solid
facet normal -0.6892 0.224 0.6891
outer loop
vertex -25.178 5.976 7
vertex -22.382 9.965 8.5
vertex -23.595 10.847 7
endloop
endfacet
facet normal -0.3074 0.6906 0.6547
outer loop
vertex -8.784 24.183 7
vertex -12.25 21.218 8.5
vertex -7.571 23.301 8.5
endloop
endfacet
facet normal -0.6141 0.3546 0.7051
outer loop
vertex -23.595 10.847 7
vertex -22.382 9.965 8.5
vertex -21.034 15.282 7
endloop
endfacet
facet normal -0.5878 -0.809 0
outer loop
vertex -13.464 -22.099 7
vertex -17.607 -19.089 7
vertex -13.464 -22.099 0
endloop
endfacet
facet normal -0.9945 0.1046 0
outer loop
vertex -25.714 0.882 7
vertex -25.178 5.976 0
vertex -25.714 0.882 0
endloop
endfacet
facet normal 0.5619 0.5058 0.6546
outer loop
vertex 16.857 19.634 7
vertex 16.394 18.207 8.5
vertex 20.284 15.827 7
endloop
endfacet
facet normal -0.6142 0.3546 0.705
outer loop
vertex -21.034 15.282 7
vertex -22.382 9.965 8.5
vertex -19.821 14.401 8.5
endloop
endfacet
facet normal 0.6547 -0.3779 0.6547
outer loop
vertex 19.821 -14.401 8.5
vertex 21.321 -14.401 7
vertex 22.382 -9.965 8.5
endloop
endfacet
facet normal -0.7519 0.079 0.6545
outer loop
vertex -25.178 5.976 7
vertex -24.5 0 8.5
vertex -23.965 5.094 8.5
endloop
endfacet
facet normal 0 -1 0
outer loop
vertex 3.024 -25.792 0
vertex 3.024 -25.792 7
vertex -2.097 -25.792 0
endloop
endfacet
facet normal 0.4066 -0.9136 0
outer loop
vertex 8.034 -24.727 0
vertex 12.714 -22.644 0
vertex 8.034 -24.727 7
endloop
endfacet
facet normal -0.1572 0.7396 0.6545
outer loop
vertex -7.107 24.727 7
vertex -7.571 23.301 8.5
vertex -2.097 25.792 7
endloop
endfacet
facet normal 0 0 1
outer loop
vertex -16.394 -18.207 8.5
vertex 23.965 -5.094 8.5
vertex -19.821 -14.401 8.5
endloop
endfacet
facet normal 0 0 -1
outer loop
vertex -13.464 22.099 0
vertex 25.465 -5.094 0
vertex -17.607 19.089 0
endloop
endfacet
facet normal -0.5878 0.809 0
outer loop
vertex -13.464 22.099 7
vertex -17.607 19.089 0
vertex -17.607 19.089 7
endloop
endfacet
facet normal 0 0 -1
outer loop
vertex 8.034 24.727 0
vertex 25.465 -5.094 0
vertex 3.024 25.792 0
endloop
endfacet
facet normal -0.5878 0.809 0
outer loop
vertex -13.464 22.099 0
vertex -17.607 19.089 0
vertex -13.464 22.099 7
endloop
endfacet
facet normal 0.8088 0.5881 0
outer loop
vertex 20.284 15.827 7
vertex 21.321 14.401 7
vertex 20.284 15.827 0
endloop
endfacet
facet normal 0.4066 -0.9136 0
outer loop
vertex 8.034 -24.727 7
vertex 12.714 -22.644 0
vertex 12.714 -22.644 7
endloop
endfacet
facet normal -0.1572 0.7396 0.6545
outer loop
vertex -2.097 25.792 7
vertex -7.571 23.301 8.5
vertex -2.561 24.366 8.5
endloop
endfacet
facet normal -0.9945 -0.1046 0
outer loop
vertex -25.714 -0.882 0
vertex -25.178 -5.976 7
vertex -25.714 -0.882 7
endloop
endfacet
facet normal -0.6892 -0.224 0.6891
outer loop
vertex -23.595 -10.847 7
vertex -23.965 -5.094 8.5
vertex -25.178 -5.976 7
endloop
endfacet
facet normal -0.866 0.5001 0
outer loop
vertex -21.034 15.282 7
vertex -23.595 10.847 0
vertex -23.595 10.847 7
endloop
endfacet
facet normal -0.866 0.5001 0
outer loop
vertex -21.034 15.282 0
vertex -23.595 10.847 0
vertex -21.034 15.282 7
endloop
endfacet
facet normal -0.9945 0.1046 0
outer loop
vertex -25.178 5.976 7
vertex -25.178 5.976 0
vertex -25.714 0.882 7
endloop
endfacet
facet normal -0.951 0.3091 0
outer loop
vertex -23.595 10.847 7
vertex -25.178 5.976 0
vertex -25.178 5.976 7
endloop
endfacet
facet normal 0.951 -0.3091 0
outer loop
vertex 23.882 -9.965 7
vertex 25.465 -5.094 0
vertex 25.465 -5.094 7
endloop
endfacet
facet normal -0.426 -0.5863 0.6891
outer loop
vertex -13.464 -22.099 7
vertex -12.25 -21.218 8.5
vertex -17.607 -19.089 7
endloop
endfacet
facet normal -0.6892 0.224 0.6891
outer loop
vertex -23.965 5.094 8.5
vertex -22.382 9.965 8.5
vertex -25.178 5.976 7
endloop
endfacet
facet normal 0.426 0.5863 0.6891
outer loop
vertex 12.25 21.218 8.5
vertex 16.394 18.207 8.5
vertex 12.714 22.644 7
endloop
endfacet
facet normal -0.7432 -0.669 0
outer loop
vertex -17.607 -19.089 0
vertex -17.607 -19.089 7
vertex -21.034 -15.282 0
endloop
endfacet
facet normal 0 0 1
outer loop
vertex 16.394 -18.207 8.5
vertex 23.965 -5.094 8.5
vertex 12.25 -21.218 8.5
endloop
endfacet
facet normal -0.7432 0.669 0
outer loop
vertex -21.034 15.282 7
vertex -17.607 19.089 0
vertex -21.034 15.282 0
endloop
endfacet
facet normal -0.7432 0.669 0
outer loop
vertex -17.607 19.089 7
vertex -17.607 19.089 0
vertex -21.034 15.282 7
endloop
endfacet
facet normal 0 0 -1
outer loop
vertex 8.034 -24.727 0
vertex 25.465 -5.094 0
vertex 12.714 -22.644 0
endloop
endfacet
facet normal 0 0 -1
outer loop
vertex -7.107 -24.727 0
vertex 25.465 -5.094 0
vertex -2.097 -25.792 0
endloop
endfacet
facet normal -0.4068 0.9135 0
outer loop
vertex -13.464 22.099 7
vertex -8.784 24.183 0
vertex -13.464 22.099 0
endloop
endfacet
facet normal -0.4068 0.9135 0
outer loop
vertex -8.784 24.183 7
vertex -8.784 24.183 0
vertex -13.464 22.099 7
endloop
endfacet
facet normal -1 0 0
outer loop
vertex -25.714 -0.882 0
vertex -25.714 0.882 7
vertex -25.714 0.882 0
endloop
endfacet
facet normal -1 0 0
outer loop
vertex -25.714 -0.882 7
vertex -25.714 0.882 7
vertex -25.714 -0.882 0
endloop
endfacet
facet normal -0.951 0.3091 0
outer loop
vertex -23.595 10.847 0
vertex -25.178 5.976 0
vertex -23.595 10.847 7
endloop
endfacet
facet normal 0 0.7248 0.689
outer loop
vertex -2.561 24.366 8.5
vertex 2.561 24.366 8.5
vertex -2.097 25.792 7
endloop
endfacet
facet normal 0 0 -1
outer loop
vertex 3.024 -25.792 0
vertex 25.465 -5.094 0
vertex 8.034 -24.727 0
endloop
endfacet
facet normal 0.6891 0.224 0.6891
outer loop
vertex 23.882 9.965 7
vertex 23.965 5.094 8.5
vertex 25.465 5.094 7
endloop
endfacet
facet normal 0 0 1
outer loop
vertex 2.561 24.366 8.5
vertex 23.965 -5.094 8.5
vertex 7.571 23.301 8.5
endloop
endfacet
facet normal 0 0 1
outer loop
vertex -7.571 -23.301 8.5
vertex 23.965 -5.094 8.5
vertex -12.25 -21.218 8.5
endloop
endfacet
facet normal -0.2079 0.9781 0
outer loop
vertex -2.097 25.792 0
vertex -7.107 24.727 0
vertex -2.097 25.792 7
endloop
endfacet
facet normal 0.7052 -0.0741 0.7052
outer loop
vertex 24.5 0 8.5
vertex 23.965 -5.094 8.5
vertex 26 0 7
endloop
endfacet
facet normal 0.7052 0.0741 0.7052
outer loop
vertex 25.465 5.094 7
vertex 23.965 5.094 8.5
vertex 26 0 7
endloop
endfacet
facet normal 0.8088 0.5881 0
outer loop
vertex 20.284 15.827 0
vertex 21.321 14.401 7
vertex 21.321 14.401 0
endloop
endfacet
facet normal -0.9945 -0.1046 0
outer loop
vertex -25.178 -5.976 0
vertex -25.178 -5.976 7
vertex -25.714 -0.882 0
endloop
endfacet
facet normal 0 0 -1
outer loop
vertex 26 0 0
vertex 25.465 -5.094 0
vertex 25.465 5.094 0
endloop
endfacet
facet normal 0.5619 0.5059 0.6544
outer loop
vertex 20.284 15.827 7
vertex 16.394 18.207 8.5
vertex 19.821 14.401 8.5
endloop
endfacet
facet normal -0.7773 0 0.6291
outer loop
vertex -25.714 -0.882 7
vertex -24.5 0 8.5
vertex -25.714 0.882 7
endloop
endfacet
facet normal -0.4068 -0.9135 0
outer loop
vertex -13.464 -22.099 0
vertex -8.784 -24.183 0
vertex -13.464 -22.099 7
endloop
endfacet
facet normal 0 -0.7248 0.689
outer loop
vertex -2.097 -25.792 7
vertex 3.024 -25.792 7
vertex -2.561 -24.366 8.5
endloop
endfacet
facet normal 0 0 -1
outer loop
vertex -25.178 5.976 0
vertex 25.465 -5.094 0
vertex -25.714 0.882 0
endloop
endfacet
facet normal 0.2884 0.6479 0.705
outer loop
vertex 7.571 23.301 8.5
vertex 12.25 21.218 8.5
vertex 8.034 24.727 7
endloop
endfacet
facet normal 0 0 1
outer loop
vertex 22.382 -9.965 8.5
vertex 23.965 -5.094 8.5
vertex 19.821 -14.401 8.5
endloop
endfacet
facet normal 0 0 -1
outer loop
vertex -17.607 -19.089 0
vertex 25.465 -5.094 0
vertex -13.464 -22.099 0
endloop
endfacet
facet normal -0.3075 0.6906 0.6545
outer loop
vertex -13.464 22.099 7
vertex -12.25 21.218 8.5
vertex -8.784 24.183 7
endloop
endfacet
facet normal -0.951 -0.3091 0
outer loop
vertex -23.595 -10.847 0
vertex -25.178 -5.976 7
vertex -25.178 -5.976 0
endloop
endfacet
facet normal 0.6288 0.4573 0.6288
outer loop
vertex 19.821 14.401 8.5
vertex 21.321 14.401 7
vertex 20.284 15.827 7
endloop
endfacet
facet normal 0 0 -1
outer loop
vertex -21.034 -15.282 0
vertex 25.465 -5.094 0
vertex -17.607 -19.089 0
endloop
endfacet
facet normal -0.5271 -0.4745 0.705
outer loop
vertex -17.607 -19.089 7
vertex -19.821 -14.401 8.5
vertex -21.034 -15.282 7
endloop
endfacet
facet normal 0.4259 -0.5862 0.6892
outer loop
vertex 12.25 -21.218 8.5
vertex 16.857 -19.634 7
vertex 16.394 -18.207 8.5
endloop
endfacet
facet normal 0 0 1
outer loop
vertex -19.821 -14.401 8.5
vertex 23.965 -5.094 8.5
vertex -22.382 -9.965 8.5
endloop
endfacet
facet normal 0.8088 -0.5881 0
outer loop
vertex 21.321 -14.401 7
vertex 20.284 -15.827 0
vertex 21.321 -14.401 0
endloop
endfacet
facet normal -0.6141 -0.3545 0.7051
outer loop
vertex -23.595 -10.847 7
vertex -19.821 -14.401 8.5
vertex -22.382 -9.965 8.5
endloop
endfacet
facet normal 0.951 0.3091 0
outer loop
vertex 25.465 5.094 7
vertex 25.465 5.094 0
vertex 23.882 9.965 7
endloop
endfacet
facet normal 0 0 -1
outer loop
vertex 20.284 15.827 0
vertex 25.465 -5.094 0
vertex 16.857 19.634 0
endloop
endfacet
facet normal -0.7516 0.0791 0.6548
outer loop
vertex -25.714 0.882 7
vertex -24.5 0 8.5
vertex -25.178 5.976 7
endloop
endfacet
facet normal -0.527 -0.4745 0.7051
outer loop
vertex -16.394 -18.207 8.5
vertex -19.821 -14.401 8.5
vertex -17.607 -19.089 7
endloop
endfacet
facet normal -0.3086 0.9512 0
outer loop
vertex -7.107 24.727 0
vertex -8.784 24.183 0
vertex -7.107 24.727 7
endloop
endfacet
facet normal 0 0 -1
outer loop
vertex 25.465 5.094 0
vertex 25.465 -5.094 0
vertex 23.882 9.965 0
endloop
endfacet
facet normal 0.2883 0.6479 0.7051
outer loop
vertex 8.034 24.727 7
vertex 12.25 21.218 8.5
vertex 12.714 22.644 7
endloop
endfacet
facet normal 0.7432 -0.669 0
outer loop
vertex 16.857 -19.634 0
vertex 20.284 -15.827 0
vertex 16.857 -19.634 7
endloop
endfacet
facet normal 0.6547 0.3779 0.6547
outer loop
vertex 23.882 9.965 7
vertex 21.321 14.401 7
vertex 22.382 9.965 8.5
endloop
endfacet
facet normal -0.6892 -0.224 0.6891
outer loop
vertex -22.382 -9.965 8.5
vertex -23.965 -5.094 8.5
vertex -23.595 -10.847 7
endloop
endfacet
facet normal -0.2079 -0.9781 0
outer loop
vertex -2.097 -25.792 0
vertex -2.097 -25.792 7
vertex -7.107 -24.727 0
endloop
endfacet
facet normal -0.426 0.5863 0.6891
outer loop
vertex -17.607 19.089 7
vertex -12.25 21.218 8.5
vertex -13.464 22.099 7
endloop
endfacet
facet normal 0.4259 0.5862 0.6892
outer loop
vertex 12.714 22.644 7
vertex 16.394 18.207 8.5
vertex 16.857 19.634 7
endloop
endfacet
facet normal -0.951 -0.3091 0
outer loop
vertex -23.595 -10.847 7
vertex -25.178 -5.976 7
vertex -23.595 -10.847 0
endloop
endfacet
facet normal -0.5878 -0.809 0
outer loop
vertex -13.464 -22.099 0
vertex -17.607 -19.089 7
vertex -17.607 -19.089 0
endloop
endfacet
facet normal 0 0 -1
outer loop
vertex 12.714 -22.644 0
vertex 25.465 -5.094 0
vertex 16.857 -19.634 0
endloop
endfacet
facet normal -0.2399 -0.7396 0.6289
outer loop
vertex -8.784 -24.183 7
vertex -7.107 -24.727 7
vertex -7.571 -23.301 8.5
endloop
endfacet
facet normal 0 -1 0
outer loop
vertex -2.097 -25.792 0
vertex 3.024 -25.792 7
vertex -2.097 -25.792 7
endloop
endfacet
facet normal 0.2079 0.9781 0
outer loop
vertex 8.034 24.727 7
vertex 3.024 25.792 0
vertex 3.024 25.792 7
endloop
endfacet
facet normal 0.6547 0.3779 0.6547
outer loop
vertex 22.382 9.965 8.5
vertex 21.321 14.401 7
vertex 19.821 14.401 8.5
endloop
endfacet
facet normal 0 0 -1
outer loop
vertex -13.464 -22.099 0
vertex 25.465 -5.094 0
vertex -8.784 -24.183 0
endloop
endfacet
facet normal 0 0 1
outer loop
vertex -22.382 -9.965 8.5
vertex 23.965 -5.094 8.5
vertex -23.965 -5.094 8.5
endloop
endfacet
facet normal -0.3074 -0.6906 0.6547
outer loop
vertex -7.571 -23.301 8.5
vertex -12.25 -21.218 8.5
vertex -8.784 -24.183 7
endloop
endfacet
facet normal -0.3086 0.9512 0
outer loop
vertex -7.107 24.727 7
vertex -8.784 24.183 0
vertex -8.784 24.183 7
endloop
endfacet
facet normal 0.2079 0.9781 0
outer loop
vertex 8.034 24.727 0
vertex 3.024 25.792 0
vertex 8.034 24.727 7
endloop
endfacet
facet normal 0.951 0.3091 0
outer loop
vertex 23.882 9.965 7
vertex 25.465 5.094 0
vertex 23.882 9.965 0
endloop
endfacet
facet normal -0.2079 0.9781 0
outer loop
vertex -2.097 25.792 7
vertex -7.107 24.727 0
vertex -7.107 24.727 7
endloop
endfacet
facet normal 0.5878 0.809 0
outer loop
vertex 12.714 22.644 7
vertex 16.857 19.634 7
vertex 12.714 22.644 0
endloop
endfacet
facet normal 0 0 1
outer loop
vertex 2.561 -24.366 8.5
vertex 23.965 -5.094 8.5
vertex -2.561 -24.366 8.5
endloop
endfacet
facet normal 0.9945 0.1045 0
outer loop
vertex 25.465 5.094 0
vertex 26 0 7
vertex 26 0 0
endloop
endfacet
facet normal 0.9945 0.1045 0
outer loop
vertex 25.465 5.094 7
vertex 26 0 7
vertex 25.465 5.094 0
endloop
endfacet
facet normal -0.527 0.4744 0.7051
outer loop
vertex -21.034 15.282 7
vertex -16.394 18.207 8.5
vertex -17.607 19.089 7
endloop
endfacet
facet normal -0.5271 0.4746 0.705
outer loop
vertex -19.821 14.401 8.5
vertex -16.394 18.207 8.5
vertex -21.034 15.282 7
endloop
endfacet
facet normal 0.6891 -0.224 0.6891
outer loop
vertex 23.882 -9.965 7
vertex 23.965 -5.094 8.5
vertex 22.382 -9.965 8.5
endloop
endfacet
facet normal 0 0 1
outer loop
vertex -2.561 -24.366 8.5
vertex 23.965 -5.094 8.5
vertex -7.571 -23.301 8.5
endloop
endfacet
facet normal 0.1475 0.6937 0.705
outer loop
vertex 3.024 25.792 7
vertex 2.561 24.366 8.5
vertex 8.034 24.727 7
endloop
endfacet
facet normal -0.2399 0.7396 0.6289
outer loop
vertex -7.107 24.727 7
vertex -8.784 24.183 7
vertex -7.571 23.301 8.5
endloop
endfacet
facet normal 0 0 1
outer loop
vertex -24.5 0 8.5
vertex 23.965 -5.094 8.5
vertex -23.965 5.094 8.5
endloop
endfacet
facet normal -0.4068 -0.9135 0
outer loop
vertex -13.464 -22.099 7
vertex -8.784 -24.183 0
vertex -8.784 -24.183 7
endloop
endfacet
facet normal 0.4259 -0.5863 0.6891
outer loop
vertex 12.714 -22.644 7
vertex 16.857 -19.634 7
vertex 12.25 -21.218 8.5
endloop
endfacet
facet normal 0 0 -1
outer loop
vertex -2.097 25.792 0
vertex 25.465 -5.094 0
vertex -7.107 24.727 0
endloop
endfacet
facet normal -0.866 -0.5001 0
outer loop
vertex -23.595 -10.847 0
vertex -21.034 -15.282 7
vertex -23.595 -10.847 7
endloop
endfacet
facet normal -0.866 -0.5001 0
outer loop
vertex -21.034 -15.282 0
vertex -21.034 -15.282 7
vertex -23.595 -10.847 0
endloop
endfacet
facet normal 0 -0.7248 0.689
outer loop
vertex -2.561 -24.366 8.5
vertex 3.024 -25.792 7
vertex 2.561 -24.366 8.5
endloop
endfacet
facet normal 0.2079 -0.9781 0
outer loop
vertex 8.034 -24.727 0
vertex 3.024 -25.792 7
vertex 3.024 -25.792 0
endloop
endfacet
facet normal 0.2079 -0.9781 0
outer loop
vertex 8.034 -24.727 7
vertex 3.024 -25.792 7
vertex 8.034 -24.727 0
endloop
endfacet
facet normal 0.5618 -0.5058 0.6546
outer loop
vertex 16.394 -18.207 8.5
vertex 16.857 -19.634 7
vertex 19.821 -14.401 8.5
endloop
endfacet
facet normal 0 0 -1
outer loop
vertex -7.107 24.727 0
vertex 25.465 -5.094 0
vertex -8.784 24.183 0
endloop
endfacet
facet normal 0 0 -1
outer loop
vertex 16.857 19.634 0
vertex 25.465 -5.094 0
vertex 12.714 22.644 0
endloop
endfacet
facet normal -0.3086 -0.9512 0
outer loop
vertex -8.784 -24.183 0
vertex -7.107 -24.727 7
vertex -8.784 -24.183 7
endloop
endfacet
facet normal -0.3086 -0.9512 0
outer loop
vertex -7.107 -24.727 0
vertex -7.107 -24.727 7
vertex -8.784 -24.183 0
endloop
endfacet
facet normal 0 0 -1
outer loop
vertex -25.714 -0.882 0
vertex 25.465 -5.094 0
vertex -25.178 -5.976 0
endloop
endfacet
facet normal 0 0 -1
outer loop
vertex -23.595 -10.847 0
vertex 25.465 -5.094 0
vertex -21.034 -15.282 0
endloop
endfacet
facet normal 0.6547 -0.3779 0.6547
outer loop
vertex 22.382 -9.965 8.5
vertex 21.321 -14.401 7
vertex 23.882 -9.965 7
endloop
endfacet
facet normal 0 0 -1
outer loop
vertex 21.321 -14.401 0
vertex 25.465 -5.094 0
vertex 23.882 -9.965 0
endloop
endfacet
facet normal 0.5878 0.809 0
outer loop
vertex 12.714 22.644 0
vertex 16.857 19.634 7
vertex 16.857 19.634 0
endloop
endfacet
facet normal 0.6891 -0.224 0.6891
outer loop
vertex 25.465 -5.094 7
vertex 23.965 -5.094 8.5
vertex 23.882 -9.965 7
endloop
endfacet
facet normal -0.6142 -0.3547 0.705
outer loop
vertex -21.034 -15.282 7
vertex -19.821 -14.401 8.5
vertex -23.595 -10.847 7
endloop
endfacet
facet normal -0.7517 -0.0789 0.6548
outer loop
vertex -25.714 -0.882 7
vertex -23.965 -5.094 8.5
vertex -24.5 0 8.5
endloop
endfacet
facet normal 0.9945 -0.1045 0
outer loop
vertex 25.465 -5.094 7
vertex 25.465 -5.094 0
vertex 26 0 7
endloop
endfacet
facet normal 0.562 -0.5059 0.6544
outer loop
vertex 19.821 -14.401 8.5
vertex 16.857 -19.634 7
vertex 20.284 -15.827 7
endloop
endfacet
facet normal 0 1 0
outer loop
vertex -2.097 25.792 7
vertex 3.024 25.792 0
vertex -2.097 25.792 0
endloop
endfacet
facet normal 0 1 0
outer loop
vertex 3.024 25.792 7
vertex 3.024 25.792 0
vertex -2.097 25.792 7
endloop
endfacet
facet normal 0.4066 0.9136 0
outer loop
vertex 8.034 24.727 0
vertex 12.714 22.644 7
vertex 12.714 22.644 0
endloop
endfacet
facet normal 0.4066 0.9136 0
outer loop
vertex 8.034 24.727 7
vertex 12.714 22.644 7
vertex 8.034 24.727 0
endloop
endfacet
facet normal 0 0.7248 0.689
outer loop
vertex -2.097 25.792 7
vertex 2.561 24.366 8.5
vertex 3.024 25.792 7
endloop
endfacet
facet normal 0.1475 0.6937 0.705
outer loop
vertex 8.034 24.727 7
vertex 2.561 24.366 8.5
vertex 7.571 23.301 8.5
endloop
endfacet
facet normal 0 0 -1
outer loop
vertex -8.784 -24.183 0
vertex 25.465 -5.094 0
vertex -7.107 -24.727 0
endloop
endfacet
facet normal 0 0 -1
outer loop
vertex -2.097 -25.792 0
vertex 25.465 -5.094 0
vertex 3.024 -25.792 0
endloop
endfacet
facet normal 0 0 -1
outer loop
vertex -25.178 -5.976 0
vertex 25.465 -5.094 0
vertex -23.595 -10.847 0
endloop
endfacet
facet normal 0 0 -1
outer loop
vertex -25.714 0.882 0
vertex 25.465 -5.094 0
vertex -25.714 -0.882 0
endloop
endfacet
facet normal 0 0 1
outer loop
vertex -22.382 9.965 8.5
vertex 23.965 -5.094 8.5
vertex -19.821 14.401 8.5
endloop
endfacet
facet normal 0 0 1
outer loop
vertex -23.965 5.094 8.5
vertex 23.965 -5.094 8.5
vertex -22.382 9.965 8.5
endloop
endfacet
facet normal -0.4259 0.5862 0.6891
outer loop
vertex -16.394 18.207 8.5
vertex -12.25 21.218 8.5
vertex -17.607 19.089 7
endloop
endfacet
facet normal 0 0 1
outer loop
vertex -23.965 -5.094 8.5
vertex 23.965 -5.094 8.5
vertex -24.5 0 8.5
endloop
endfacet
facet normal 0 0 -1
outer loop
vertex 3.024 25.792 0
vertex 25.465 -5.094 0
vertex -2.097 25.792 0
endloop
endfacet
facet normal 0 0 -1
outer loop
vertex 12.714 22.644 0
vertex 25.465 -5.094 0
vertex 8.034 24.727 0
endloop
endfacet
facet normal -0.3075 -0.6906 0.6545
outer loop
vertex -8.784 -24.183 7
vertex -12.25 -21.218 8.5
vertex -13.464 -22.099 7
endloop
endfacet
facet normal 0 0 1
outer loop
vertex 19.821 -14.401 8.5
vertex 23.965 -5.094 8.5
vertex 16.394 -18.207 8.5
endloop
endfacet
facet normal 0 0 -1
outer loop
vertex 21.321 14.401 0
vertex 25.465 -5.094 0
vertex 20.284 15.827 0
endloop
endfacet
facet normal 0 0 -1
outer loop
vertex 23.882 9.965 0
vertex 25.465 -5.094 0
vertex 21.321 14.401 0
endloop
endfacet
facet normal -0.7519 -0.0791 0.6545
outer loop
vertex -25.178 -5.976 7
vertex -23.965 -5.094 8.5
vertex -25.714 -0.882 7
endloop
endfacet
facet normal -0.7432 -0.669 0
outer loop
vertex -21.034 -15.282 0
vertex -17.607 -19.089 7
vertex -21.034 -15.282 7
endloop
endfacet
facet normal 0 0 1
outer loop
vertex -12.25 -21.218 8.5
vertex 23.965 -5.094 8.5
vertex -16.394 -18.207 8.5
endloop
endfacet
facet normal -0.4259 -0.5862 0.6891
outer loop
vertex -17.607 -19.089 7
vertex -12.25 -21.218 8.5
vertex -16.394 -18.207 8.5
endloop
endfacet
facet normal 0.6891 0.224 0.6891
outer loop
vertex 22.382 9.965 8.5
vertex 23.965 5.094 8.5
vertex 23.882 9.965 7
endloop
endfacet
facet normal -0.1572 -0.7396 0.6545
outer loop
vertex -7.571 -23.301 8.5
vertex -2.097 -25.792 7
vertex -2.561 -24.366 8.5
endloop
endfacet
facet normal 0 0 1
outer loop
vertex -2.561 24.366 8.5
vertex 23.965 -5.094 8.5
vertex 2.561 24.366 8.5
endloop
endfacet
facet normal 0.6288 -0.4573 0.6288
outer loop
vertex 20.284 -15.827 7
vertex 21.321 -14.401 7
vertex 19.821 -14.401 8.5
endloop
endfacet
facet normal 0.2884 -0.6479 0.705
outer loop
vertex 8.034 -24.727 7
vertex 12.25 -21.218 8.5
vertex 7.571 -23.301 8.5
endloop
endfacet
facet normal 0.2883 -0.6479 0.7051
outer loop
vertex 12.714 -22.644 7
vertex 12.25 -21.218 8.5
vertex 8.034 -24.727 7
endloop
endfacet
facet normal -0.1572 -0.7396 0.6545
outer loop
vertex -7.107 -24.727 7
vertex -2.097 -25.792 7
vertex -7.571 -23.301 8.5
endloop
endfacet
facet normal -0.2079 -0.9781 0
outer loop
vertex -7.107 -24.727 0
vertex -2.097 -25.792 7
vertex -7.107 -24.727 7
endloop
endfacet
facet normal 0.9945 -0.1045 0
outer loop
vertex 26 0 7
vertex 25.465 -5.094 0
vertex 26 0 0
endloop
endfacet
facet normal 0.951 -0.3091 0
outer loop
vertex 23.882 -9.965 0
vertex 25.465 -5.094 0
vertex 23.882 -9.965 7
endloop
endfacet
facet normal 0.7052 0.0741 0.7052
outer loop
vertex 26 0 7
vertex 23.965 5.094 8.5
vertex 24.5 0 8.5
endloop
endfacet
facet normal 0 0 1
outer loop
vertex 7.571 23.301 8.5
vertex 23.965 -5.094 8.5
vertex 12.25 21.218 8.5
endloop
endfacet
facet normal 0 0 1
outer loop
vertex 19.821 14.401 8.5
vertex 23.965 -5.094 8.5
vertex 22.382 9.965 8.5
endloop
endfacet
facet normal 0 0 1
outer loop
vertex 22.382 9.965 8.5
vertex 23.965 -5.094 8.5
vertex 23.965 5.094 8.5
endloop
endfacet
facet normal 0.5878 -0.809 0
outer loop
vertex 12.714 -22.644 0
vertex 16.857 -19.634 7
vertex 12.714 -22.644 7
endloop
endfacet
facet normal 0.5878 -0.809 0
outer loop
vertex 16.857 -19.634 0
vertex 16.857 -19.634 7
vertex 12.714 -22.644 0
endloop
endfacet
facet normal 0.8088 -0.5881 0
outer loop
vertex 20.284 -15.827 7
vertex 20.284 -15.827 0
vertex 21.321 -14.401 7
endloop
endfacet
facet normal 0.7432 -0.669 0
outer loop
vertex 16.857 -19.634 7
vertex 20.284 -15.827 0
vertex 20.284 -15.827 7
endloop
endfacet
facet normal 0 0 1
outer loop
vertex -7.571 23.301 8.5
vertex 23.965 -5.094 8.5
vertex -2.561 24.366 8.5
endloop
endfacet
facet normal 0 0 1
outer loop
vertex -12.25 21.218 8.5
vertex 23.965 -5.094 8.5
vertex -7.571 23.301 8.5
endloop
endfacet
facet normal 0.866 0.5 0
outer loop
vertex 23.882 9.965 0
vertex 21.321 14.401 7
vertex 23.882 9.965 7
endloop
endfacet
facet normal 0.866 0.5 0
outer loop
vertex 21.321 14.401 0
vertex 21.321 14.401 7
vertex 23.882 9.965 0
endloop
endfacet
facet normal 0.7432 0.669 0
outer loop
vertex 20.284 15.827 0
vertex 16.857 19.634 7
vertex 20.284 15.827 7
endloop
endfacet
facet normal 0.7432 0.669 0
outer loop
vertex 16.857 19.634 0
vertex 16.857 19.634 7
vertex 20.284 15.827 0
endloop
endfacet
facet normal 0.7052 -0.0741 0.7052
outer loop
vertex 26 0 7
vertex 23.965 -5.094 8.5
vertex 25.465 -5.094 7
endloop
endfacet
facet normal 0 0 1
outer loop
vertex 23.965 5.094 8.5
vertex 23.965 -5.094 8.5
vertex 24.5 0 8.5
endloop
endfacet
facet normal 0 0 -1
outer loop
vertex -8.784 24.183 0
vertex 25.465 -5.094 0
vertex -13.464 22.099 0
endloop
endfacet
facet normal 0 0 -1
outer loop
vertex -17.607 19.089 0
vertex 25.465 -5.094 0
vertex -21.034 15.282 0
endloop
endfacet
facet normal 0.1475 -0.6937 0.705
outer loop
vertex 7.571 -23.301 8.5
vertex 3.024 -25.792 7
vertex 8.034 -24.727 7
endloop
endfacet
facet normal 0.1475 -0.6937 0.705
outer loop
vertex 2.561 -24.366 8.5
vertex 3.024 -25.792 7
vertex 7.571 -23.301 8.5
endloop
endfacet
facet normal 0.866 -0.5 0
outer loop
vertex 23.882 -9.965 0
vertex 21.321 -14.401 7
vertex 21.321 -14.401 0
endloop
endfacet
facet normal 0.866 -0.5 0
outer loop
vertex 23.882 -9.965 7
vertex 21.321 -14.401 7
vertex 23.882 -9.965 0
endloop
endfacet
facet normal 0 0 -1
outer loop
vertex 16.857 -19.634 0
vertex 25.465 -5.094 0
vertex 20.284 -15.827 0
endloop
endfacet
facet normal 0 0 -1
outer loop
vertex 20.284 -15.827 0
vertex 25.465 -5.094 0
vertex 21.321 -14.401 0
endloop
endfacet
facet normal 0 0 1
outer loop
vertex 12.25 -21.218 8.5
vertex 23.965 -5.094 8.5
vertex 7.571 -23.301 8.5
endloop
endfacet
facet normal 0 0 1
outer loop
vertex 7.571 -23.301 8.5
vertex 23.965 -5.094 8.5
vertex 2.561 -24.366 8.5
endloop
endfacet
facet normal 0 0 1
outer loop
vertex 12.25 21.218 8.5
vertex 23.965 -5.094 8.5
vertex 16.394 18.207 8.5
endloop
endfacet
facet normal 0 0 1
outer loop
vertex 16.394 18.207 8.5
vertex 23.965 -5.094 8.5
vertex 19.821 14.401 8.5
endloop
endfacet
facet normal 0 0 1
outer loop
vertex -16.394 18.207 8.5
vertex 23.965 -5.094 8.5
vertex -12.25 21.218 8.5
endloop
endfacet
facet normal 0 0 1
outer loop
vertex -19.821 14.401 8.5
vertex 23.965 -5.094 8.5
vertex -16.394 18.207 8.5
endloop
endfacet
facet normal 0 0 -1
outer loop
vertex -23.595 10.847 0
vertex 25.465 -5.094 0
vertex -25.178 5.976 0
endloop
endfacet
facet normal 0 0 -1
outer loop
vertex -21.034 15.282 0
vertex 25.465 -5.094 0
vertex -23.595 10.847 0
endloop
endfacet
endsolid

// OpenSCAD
// corpus 1485673: a cone rounding off a cylinder's rim — two solids of revolution on one axis sum as
// the revolution of their meridian sections (planes, a cylinder and a cone; the mesh route took 27 s).
minkowski() {
  cylinder(r = 24.5, h = 7);
  cylinder(r1 = 1.5, r2 = 0, h = 1.5);
}
